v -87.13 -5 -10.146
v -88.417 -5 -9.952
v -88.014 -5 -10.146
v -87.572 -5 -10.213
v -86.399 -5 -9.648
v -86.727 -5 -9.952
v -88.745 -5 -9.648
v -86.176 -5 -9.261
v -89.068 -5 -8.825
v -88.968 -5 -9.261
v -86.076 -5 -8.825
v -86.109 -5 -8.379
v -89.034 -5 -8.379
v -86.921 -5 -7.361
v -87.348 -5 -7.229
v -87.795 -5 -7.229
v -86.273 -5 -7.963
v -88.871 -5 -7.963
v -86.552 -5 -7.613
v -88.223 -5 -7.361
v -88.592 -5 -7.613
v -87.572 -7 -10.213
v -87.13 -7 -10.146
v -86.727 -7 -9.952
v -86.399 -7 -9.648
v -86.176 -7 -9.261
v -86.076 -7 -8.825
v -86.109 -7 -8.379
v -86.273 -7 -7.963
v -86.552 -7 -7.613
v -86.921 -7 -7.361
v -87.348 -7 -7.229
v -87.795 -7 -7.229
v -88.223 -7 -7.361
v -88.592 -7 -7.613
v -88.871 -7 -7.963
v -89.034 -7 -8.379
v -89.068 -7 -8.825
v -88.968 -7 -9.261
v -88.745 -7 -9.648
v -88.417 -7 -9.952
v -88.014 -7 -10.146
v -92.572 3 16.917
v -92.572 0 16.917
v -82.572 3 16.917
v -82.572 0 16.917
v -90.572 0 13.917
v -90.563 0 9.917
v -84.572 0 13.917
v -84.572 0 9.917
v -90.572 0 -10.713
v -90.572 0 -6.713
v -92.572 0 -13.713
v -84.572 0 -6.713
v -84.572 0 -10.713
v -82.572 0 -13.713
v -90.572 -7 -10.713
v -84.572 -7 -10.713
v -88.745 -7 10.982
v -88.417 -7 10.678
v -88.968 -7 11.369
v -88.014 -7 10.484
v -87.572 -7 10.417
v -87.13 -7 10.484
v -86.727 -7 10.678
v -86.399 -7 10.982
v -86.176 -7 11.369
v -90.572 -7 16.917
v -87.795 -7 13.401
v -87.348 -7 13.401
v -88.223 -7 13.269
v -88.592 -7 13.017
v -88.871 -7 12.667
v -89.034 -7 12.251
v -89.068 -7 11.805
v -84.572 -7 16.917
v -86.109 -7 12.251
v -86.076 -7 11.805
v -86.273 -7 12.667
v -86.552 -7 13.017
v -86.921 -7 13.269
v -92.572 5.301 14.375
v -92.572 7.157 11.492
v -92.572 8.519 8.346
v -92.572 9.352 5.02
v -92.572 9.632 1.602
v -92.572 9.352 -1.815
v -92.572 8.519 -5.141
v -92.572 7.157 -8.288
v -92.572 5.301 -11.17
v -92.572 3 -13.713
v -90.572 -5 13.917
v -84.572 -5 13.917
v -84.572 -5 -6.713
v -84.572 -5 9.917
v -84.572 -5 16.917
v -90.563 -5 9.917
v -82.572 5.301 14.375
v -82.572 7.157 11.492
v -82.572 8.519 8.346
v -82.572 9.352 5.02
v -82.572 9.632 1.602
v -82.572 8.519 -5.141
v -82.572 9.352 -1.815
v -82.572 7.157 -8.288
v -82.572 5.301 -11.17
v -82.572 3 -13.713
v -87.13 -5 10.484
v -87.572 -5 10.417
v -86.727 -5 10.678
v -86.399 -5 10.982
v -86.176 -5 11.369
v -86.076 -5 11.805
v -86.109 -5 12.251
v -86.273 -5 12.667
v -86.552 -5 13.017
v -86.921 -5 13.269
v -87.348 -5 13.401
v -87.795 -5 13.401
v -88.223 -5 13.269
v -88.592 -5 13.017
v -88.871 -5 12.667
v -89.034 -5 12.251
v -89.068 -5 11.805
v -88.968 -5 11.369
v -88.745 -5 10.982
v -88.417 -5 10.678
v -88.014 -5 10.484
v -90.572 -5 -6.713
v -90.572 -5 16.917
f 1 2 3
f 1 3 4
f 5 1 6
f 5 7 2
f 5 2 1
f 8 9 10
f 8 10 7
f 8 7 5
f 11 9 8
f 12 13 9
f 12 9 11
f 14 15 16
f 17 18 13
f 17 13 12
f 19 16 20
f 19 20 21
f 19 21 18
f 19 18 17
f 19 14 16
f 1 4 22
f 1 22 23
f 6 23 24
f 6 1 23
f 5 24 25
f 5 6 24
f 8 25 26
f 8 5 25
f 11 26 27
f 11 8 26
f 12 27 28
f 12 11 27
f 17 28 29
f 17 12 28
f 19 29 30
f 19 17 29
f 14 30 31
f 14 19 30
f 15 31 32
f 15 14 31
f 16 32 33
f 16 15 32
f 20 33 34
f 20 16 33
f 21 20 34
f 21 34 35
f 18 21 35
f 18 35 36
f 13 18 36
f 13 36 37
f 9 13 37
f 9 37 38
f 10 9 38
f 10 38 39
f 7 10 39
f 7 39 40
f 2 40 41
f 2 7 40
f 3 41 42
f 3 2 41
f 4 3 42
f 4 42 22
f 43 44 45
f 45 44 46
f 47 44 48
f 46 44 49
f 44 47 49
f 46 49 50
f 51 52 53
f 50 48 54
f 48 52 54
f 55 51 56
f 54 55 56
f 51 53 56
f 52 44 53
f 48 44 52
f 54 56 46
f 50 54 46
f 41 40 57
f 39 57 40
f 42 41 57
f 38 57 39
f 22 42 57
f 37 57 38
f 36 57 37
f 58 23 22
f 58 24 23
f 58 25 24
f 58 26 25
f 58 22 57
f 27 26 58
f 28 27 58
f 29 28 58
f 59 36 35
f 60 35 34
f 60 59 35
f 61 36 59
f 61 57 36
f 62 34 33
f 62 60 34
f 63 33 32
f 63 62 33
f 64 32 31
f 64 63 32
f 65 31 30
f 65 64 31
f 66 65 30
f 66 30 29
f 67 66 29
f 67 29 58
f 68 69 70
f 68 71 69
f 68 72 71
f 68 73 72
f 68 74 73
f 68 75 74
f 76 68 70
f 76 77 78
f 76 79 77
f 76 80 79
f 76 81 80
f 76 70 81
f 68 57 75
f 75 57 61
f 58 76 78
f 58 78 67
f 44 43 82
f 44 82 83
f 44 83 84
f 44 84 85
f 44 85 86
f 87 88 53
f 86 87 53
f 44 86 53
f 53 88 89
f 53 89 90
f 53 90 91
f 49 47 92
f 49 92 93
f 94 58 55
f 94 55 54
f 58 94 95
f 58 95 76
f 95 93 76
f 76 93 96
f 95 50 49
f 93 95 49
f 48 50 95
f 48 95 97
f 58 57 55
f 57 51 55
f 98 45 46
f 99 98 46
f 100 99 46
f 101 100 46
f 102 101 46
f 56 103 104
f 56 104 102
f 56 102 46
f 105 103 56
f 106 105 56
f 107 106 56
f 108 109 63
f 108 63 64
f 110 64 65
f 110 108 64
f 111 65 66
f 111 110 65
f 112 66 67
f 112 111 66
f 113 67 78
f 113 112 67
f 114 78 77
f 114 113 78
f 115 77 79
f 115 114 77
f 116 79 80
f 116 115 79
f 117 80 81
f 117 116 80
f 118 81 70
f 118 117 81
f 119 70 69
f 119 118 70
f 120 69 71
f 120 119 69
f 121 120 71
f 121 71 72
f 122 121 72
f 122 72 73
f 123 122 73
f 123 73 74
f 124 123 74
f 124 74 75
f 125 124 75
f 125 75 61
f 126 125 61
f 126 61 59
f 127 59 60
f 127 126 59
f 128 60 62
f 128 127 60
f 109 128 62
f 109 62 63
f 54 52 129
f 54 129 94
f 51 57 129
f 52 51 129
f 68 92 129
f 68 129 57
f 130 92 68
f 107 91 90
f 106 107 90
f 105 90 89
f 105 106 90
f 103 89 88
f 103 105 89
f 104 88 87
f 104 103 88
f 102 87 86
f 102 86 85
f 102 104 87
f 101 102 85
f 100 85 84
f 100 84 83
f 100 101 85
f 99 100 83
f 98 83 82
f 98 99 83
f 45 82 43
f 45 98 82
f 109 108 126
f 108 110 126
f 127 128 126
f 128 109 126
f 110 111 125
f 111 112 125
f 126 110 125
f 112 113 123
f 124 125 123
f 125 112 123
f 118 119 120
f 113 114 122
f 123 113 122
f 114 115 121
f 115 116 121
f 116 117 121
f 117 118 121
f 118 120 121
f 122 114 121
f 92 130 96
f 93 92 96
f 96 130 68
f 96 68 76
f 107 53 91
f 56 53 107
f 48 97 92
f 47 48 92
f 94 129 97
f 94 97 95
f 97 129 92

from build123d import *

# Parameters (mm, degrees)
SKETCH_1_W      = 10
SKETCH_1_H      = 30.63
EXTRUDE_1_DEPTH = 3
EXTRUDE_2_DEPTH = 10
SKETCH_3_W      = 6
SKETCH_3_H      = 4
EXTRUDE_3_DEPTH = 5
SKETCH_4_W      = 6
SKETCH_4_H      = 27.63
SKETCH_4_R      = 1.5
EXTRUDE_4_DEPTH = 2


with BuildPart() as part:
    # Эскиз1 → Бобышка-Вытянуть1 (new body)
    with BuildSketch(Plane(origin=(0, 0, 0), x_dir=(1, 0, 0), z_dir=(0, 1, 0))):
        with Locations((-87.571813581, -1.602363593)):
            Rectangle(SKETCH_1_W, SKETCH_1_H)
    extrude(amount=EXTRUDE_1_DEPTH)

    # Эскиз2 → Бобышка-Вытянуть2 (add)
    with BuildSketch(Plane(origin=(-82.571813581, 0, 0), x_dir=(0, 0, -1), z_dir=(1, 0, 0))):
        with BuildLine():
            Line((-16.917363593, 3), (13.712636407, 3))
            ThreePointArc((13.712636407, 3), (-1.602363593, 9.631604996), (-16.917363593, 3))
        make_face()
    extrude(amount=-EXTRUDE_2_DEPTH)

    # Эскиз3 → Бобышка-Вытянуть3 (add)
    with BuildSketch(Plane.XZ):
        with Locations((-87.571813581, -8.712636407)):
            Rectangle(SKETCH_3_W, SKETCH_3_H)
        Polygon((-90.562968792, 9.917363593), (-90.571813581, 13.917363593), (-84.571813581, 13.917363593), (-84.571813581, 9.917363593), align=None)
    extrude(amount=EXTRUDE_3_DEPTH)

    # Эскиз4 → Бобышка-Вытянуть4 (add)
    with BuildSketch(Plane.XZ.offset(5)):
        with Locations((-87.571813581, 3.102363593)):
            Rectangle(SKETCH_4_W, SKETCH_4_H)
        with Locations(Location((-87.571813581, 11.917363593, 0), (0, 0, 270))):
            Circle(SKETCH_4_R, mode=Mode.SUBTRACT)
        with Locations(Location((-87.571813581, -8.712636407, 0), (0, 0, 270))):
            Circle(SKETCH_4_R, mode=Mode.SUBTRACT)
    extrude(amount=EXTRUDE_4_DEPTH)


solid = part.part
